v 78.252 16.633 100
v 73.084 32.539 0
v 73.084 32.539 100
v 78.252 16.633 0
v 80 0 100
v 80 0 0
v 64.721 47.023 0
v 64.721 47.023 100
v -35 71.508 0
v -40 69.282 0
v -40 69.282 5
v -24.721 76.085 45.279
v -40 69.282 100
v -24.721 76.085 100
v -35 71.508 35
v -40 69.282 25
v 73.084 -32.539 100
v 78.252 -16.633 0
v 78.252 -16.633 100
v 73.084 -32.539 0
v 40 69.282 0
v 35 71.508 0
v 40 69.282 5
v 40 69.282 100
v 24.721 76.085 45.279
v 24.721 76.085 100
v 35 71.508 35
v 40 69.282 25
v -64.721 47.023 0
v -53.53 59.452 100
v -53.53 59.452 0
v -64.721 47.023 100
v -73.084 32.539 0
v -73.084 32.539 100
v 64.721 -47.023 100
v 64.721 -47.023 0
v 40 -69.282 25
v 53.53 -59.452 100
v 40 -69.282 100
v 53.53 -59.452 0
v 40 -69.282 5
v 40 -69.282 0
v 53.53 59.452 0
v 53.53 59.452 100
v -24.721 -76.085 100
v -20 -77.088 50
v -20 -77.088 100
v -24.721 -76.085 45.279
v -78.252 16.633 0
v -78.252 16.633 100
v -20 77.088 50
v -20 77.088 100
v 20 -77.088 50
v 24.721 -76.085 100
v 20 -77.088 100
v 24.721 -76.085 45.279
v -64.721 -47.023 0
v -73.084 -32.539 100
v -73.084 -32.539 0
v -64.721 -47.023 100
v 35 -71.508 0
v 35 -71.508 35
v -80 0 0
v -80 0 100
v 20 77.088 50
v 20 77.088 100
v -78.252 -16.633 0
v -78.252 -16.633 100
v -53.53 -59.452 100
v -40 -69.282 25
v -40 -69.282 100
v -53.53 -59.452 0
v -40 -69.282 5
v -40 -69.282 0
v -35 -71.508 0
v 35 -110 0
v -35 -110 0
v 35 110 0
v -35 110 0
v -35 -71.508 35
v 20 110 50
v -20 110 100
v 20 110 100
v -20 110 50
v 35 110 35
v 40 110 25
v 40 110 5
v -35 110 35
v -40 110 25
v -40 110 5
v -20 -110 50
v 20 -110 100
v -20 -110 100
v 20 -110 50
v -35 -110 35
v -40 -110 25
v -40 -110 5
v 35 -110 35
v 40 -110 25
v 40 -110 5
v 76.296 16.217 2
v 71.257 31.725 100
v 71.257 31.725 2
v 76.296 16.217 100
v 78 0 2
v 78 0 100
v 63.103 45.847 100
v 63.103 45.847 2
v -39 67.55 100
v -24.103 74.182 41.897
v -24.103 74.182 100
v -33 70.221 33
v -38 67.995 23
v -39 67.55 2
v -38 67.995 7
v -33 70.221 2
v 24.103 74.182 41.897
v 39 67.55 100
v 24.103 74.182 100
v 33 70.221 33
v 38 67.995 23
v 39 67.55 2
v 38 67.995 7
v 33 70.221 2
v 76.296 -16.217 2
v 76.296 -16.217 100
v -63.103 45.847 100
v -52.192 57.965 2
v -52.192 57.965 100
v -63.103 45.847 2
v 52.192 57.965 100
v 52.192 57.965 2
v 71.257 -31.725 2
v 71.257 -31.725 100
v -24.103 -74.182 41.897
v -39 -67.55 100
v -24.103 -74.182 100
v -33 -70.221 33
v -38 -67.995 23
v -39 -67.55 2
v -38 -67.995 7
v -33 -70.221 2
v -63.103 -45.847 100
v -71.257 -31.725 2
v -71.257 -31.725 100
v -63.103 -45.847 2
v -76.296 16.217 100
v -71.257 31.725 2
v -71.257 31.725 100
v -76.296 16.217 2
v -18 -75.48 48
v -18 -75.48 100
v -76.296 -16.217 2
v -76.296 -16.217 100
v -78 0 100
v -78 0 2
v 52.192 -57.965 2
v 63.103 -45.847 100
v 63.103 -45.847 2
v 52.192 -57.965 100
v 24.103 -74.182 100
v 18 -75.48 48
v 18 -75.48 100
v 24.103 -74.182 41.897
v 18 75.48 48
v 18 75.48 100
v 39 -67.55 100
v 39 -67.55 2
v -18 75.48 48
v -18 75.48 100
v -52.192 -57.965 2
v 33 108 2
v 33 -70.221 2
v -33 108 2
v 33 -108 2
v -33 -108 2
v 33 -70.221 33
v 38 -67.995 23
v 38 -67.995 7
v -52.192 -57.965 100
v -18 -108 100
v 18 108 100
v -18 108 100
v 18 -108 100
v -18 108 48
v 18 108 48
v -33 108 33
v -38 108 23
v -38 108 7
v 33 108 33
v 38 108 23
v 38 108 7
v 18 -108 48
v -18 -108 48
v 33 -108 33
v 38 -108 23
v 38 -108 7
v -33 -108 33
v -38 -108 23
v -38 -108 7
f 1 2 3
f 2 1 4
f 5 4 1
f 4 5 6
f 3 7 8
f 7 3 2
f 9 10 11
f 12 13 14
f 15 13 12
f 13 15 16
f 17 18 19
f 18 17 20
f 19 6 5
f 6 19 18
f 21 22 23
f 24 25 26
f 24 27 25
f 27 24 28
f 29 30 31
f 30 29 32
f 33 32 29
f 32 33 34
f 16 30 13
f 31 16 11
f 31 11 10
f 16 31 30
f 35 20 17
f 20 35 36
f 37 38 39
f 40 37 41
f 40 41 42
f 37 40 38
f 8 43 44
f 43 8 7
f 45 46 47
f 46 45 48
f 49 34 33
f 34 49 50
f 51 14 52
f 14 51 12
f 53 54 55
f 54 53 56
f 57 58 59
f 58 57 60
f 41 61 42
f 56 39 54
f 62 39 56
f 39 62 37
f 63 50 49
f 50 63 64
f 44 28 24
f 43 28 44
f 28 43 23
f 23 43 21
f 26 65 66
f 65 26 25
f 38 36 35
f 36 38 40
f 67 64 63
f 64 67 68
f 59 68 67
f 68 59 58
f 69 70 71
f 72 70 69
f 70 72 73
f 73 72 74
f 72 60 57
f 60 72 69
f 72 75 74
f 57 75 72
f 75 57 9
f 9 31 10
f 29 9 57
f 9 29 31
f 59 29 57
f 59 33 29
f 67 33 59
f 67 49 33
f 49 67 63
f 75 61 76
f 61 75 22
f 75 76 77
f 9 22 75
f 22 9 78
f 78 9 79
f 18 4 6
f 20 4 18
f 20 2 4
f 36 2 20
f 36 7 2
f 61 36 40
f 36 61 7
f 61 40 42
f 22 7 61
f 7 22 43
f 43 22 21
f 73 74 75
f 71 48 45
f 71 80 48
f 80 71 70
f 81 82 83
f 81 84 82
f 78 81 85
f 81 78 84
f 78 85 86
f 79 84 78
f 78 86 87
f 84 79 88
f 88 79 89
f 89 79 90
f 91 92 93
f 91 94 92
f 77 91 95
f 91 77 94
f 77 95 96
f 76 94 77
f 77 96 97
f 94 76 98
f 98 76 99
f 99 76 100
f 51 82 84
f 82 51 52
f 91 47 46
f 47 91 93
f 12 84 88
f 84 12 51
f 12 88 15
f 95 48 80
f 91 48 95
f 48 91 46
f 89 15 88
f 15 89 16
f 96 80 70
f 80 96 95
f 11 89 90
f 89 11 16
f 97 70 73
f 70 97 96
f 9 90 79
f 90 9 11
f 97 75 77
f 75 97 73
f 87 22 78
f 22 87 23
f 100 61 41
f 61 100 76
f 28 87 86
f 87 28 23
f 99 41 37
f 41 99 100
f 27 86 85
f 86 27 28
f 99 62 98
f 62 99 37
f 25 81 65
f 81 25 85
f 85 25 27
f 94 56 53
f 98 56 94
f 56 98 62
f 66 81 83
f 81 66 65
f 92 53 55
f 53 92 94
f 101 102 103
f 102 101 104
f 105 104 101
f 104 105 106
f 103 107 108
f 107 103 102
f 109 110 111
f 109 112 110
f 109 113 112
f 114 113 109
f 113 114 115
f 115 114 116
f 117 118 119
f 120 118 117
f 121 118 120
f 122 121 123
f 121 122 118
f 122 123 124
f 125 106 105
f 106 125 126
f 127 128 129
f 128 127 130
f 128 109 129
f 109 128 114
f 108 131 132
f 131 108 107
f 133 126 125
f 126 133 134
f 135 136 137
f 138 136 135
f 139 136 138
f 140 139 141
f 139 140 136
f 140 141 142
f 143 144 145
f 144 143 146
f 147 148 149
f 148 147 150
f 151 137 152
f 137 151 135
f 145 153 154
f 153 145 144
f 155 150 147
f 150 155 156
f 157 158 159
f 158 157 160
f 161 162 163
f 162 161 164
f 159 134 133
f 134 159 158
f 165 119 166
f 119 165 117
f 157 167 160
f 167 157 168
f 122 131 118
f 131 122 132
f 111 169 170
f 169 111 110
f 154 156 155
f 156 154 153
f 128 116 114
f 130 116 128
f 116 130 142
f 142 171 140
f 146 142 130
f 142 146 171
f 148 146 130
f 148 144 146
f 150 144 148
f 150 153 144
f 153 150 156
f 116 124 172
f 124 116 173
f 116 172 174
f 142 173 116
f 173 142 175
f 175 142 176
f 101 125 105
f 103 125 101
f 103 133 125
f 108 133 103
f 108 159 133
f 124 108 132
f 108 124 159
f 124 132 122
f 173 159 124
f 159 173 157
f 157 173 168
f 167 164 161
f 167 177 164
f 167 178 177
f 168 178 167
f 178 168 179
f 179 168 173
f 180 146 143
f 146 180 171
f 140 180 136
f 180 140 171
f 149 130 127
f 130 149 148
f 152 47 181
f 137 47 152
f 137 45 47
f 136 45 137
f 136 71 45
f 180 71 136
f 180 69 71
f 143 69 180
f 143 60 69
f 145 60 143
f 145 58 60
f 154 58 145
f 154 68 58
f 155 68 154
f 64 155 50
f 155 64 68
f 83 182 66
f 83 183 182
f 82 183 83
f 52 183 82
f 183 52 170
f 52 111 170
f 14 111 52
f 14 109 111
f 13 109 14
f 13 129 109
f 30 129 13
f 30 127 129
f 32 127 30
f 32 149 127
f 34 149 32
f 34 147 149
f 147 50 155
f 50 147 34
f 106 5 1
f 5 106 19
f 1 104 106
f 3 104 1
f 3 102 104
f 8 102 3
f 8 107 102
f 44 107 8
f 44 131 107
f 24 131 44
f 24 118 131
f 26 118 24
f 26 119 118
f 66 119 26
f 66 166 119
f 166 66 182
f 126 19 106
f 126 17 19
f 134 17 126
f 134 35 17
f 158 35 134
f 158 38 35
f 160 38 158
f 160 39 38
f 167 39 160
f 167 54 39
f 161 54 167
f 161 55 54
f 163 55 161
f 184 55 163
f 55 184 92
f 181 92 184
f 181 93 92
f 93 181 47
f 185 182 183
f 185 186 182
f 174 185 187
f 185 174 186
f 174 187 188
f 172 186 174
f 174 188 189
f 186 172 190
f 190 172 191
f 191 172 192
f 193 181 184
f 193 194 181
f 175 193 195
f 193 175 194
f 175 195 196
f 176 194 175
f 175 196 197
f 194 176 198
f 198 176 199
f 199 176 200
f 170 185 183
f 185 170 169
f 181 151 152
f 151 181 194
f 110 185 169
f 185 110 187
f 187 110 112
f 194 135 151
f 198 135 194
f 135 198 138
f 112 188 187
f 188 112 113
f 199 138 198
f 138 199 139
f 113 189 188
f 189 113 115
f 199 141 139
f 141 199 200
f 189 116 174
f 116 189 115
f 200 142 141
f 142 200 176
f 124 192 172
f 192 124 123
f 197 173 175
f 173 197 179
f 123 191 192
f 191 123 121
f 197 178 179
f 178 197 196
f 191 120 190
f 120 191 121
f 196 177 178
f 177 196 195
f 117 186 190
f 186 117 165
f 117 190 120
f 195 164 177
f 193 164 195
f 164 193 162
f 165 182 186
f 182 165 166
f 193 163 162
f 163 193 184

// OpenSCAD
h = 150;
r = 80;
s = 2;


leg_w = 30;

first_cut_h = 100;



leg_polygon_points = [
[0,0],
[r/2-5,0],[r/2,5],
[r/2,h/5-5],[r/2-5,h/5+5],
[r/4,h/3],
[r/4,h-r/4],[r/5,h-r/5+5],[r/6,h-r/7+7],
[0,h]];

leg_polygon_points_cut = [
[0,s],
[r/2-5-s,s],[r/2-s,5+s],
[r/2-s,h/5-5-s],[r/2-5-s,h/5+5-s],
[r/4-s,h/3-s],
[r/4-s,h-r/4-s],[r/5-s,h-r/5+5-s],[r/6-s,h-r/7+7-s],
[0,h-s]];


module leg() {
    rotate([90,0,0]) linear_extrude(leg_w*2+2*r){
        polygon(leg_polygon_points);
        mirror()polygon(leg_polygon_points);
    }
}


difference(){
    union(){
        cylinder(h,r,r);
        translate([0,0,h])sphere(r);
        translate([0,r+leg_w,0]) leg();
    }
    translate([0,0,s]) cylinder(h-s,r-s,r-s);
    translate([-500,-500,first_cut_h]) cube([1000,1000,1000]);
    translate([0,r+leg_w-s,0]) rotate([90,0,0]) linear_extrude(leg_w*2+2*r-2*s){
        polygon(leg_polygon_points_cut);
        mirror()polygon(leg_polygon_points_cut);
    }
}
